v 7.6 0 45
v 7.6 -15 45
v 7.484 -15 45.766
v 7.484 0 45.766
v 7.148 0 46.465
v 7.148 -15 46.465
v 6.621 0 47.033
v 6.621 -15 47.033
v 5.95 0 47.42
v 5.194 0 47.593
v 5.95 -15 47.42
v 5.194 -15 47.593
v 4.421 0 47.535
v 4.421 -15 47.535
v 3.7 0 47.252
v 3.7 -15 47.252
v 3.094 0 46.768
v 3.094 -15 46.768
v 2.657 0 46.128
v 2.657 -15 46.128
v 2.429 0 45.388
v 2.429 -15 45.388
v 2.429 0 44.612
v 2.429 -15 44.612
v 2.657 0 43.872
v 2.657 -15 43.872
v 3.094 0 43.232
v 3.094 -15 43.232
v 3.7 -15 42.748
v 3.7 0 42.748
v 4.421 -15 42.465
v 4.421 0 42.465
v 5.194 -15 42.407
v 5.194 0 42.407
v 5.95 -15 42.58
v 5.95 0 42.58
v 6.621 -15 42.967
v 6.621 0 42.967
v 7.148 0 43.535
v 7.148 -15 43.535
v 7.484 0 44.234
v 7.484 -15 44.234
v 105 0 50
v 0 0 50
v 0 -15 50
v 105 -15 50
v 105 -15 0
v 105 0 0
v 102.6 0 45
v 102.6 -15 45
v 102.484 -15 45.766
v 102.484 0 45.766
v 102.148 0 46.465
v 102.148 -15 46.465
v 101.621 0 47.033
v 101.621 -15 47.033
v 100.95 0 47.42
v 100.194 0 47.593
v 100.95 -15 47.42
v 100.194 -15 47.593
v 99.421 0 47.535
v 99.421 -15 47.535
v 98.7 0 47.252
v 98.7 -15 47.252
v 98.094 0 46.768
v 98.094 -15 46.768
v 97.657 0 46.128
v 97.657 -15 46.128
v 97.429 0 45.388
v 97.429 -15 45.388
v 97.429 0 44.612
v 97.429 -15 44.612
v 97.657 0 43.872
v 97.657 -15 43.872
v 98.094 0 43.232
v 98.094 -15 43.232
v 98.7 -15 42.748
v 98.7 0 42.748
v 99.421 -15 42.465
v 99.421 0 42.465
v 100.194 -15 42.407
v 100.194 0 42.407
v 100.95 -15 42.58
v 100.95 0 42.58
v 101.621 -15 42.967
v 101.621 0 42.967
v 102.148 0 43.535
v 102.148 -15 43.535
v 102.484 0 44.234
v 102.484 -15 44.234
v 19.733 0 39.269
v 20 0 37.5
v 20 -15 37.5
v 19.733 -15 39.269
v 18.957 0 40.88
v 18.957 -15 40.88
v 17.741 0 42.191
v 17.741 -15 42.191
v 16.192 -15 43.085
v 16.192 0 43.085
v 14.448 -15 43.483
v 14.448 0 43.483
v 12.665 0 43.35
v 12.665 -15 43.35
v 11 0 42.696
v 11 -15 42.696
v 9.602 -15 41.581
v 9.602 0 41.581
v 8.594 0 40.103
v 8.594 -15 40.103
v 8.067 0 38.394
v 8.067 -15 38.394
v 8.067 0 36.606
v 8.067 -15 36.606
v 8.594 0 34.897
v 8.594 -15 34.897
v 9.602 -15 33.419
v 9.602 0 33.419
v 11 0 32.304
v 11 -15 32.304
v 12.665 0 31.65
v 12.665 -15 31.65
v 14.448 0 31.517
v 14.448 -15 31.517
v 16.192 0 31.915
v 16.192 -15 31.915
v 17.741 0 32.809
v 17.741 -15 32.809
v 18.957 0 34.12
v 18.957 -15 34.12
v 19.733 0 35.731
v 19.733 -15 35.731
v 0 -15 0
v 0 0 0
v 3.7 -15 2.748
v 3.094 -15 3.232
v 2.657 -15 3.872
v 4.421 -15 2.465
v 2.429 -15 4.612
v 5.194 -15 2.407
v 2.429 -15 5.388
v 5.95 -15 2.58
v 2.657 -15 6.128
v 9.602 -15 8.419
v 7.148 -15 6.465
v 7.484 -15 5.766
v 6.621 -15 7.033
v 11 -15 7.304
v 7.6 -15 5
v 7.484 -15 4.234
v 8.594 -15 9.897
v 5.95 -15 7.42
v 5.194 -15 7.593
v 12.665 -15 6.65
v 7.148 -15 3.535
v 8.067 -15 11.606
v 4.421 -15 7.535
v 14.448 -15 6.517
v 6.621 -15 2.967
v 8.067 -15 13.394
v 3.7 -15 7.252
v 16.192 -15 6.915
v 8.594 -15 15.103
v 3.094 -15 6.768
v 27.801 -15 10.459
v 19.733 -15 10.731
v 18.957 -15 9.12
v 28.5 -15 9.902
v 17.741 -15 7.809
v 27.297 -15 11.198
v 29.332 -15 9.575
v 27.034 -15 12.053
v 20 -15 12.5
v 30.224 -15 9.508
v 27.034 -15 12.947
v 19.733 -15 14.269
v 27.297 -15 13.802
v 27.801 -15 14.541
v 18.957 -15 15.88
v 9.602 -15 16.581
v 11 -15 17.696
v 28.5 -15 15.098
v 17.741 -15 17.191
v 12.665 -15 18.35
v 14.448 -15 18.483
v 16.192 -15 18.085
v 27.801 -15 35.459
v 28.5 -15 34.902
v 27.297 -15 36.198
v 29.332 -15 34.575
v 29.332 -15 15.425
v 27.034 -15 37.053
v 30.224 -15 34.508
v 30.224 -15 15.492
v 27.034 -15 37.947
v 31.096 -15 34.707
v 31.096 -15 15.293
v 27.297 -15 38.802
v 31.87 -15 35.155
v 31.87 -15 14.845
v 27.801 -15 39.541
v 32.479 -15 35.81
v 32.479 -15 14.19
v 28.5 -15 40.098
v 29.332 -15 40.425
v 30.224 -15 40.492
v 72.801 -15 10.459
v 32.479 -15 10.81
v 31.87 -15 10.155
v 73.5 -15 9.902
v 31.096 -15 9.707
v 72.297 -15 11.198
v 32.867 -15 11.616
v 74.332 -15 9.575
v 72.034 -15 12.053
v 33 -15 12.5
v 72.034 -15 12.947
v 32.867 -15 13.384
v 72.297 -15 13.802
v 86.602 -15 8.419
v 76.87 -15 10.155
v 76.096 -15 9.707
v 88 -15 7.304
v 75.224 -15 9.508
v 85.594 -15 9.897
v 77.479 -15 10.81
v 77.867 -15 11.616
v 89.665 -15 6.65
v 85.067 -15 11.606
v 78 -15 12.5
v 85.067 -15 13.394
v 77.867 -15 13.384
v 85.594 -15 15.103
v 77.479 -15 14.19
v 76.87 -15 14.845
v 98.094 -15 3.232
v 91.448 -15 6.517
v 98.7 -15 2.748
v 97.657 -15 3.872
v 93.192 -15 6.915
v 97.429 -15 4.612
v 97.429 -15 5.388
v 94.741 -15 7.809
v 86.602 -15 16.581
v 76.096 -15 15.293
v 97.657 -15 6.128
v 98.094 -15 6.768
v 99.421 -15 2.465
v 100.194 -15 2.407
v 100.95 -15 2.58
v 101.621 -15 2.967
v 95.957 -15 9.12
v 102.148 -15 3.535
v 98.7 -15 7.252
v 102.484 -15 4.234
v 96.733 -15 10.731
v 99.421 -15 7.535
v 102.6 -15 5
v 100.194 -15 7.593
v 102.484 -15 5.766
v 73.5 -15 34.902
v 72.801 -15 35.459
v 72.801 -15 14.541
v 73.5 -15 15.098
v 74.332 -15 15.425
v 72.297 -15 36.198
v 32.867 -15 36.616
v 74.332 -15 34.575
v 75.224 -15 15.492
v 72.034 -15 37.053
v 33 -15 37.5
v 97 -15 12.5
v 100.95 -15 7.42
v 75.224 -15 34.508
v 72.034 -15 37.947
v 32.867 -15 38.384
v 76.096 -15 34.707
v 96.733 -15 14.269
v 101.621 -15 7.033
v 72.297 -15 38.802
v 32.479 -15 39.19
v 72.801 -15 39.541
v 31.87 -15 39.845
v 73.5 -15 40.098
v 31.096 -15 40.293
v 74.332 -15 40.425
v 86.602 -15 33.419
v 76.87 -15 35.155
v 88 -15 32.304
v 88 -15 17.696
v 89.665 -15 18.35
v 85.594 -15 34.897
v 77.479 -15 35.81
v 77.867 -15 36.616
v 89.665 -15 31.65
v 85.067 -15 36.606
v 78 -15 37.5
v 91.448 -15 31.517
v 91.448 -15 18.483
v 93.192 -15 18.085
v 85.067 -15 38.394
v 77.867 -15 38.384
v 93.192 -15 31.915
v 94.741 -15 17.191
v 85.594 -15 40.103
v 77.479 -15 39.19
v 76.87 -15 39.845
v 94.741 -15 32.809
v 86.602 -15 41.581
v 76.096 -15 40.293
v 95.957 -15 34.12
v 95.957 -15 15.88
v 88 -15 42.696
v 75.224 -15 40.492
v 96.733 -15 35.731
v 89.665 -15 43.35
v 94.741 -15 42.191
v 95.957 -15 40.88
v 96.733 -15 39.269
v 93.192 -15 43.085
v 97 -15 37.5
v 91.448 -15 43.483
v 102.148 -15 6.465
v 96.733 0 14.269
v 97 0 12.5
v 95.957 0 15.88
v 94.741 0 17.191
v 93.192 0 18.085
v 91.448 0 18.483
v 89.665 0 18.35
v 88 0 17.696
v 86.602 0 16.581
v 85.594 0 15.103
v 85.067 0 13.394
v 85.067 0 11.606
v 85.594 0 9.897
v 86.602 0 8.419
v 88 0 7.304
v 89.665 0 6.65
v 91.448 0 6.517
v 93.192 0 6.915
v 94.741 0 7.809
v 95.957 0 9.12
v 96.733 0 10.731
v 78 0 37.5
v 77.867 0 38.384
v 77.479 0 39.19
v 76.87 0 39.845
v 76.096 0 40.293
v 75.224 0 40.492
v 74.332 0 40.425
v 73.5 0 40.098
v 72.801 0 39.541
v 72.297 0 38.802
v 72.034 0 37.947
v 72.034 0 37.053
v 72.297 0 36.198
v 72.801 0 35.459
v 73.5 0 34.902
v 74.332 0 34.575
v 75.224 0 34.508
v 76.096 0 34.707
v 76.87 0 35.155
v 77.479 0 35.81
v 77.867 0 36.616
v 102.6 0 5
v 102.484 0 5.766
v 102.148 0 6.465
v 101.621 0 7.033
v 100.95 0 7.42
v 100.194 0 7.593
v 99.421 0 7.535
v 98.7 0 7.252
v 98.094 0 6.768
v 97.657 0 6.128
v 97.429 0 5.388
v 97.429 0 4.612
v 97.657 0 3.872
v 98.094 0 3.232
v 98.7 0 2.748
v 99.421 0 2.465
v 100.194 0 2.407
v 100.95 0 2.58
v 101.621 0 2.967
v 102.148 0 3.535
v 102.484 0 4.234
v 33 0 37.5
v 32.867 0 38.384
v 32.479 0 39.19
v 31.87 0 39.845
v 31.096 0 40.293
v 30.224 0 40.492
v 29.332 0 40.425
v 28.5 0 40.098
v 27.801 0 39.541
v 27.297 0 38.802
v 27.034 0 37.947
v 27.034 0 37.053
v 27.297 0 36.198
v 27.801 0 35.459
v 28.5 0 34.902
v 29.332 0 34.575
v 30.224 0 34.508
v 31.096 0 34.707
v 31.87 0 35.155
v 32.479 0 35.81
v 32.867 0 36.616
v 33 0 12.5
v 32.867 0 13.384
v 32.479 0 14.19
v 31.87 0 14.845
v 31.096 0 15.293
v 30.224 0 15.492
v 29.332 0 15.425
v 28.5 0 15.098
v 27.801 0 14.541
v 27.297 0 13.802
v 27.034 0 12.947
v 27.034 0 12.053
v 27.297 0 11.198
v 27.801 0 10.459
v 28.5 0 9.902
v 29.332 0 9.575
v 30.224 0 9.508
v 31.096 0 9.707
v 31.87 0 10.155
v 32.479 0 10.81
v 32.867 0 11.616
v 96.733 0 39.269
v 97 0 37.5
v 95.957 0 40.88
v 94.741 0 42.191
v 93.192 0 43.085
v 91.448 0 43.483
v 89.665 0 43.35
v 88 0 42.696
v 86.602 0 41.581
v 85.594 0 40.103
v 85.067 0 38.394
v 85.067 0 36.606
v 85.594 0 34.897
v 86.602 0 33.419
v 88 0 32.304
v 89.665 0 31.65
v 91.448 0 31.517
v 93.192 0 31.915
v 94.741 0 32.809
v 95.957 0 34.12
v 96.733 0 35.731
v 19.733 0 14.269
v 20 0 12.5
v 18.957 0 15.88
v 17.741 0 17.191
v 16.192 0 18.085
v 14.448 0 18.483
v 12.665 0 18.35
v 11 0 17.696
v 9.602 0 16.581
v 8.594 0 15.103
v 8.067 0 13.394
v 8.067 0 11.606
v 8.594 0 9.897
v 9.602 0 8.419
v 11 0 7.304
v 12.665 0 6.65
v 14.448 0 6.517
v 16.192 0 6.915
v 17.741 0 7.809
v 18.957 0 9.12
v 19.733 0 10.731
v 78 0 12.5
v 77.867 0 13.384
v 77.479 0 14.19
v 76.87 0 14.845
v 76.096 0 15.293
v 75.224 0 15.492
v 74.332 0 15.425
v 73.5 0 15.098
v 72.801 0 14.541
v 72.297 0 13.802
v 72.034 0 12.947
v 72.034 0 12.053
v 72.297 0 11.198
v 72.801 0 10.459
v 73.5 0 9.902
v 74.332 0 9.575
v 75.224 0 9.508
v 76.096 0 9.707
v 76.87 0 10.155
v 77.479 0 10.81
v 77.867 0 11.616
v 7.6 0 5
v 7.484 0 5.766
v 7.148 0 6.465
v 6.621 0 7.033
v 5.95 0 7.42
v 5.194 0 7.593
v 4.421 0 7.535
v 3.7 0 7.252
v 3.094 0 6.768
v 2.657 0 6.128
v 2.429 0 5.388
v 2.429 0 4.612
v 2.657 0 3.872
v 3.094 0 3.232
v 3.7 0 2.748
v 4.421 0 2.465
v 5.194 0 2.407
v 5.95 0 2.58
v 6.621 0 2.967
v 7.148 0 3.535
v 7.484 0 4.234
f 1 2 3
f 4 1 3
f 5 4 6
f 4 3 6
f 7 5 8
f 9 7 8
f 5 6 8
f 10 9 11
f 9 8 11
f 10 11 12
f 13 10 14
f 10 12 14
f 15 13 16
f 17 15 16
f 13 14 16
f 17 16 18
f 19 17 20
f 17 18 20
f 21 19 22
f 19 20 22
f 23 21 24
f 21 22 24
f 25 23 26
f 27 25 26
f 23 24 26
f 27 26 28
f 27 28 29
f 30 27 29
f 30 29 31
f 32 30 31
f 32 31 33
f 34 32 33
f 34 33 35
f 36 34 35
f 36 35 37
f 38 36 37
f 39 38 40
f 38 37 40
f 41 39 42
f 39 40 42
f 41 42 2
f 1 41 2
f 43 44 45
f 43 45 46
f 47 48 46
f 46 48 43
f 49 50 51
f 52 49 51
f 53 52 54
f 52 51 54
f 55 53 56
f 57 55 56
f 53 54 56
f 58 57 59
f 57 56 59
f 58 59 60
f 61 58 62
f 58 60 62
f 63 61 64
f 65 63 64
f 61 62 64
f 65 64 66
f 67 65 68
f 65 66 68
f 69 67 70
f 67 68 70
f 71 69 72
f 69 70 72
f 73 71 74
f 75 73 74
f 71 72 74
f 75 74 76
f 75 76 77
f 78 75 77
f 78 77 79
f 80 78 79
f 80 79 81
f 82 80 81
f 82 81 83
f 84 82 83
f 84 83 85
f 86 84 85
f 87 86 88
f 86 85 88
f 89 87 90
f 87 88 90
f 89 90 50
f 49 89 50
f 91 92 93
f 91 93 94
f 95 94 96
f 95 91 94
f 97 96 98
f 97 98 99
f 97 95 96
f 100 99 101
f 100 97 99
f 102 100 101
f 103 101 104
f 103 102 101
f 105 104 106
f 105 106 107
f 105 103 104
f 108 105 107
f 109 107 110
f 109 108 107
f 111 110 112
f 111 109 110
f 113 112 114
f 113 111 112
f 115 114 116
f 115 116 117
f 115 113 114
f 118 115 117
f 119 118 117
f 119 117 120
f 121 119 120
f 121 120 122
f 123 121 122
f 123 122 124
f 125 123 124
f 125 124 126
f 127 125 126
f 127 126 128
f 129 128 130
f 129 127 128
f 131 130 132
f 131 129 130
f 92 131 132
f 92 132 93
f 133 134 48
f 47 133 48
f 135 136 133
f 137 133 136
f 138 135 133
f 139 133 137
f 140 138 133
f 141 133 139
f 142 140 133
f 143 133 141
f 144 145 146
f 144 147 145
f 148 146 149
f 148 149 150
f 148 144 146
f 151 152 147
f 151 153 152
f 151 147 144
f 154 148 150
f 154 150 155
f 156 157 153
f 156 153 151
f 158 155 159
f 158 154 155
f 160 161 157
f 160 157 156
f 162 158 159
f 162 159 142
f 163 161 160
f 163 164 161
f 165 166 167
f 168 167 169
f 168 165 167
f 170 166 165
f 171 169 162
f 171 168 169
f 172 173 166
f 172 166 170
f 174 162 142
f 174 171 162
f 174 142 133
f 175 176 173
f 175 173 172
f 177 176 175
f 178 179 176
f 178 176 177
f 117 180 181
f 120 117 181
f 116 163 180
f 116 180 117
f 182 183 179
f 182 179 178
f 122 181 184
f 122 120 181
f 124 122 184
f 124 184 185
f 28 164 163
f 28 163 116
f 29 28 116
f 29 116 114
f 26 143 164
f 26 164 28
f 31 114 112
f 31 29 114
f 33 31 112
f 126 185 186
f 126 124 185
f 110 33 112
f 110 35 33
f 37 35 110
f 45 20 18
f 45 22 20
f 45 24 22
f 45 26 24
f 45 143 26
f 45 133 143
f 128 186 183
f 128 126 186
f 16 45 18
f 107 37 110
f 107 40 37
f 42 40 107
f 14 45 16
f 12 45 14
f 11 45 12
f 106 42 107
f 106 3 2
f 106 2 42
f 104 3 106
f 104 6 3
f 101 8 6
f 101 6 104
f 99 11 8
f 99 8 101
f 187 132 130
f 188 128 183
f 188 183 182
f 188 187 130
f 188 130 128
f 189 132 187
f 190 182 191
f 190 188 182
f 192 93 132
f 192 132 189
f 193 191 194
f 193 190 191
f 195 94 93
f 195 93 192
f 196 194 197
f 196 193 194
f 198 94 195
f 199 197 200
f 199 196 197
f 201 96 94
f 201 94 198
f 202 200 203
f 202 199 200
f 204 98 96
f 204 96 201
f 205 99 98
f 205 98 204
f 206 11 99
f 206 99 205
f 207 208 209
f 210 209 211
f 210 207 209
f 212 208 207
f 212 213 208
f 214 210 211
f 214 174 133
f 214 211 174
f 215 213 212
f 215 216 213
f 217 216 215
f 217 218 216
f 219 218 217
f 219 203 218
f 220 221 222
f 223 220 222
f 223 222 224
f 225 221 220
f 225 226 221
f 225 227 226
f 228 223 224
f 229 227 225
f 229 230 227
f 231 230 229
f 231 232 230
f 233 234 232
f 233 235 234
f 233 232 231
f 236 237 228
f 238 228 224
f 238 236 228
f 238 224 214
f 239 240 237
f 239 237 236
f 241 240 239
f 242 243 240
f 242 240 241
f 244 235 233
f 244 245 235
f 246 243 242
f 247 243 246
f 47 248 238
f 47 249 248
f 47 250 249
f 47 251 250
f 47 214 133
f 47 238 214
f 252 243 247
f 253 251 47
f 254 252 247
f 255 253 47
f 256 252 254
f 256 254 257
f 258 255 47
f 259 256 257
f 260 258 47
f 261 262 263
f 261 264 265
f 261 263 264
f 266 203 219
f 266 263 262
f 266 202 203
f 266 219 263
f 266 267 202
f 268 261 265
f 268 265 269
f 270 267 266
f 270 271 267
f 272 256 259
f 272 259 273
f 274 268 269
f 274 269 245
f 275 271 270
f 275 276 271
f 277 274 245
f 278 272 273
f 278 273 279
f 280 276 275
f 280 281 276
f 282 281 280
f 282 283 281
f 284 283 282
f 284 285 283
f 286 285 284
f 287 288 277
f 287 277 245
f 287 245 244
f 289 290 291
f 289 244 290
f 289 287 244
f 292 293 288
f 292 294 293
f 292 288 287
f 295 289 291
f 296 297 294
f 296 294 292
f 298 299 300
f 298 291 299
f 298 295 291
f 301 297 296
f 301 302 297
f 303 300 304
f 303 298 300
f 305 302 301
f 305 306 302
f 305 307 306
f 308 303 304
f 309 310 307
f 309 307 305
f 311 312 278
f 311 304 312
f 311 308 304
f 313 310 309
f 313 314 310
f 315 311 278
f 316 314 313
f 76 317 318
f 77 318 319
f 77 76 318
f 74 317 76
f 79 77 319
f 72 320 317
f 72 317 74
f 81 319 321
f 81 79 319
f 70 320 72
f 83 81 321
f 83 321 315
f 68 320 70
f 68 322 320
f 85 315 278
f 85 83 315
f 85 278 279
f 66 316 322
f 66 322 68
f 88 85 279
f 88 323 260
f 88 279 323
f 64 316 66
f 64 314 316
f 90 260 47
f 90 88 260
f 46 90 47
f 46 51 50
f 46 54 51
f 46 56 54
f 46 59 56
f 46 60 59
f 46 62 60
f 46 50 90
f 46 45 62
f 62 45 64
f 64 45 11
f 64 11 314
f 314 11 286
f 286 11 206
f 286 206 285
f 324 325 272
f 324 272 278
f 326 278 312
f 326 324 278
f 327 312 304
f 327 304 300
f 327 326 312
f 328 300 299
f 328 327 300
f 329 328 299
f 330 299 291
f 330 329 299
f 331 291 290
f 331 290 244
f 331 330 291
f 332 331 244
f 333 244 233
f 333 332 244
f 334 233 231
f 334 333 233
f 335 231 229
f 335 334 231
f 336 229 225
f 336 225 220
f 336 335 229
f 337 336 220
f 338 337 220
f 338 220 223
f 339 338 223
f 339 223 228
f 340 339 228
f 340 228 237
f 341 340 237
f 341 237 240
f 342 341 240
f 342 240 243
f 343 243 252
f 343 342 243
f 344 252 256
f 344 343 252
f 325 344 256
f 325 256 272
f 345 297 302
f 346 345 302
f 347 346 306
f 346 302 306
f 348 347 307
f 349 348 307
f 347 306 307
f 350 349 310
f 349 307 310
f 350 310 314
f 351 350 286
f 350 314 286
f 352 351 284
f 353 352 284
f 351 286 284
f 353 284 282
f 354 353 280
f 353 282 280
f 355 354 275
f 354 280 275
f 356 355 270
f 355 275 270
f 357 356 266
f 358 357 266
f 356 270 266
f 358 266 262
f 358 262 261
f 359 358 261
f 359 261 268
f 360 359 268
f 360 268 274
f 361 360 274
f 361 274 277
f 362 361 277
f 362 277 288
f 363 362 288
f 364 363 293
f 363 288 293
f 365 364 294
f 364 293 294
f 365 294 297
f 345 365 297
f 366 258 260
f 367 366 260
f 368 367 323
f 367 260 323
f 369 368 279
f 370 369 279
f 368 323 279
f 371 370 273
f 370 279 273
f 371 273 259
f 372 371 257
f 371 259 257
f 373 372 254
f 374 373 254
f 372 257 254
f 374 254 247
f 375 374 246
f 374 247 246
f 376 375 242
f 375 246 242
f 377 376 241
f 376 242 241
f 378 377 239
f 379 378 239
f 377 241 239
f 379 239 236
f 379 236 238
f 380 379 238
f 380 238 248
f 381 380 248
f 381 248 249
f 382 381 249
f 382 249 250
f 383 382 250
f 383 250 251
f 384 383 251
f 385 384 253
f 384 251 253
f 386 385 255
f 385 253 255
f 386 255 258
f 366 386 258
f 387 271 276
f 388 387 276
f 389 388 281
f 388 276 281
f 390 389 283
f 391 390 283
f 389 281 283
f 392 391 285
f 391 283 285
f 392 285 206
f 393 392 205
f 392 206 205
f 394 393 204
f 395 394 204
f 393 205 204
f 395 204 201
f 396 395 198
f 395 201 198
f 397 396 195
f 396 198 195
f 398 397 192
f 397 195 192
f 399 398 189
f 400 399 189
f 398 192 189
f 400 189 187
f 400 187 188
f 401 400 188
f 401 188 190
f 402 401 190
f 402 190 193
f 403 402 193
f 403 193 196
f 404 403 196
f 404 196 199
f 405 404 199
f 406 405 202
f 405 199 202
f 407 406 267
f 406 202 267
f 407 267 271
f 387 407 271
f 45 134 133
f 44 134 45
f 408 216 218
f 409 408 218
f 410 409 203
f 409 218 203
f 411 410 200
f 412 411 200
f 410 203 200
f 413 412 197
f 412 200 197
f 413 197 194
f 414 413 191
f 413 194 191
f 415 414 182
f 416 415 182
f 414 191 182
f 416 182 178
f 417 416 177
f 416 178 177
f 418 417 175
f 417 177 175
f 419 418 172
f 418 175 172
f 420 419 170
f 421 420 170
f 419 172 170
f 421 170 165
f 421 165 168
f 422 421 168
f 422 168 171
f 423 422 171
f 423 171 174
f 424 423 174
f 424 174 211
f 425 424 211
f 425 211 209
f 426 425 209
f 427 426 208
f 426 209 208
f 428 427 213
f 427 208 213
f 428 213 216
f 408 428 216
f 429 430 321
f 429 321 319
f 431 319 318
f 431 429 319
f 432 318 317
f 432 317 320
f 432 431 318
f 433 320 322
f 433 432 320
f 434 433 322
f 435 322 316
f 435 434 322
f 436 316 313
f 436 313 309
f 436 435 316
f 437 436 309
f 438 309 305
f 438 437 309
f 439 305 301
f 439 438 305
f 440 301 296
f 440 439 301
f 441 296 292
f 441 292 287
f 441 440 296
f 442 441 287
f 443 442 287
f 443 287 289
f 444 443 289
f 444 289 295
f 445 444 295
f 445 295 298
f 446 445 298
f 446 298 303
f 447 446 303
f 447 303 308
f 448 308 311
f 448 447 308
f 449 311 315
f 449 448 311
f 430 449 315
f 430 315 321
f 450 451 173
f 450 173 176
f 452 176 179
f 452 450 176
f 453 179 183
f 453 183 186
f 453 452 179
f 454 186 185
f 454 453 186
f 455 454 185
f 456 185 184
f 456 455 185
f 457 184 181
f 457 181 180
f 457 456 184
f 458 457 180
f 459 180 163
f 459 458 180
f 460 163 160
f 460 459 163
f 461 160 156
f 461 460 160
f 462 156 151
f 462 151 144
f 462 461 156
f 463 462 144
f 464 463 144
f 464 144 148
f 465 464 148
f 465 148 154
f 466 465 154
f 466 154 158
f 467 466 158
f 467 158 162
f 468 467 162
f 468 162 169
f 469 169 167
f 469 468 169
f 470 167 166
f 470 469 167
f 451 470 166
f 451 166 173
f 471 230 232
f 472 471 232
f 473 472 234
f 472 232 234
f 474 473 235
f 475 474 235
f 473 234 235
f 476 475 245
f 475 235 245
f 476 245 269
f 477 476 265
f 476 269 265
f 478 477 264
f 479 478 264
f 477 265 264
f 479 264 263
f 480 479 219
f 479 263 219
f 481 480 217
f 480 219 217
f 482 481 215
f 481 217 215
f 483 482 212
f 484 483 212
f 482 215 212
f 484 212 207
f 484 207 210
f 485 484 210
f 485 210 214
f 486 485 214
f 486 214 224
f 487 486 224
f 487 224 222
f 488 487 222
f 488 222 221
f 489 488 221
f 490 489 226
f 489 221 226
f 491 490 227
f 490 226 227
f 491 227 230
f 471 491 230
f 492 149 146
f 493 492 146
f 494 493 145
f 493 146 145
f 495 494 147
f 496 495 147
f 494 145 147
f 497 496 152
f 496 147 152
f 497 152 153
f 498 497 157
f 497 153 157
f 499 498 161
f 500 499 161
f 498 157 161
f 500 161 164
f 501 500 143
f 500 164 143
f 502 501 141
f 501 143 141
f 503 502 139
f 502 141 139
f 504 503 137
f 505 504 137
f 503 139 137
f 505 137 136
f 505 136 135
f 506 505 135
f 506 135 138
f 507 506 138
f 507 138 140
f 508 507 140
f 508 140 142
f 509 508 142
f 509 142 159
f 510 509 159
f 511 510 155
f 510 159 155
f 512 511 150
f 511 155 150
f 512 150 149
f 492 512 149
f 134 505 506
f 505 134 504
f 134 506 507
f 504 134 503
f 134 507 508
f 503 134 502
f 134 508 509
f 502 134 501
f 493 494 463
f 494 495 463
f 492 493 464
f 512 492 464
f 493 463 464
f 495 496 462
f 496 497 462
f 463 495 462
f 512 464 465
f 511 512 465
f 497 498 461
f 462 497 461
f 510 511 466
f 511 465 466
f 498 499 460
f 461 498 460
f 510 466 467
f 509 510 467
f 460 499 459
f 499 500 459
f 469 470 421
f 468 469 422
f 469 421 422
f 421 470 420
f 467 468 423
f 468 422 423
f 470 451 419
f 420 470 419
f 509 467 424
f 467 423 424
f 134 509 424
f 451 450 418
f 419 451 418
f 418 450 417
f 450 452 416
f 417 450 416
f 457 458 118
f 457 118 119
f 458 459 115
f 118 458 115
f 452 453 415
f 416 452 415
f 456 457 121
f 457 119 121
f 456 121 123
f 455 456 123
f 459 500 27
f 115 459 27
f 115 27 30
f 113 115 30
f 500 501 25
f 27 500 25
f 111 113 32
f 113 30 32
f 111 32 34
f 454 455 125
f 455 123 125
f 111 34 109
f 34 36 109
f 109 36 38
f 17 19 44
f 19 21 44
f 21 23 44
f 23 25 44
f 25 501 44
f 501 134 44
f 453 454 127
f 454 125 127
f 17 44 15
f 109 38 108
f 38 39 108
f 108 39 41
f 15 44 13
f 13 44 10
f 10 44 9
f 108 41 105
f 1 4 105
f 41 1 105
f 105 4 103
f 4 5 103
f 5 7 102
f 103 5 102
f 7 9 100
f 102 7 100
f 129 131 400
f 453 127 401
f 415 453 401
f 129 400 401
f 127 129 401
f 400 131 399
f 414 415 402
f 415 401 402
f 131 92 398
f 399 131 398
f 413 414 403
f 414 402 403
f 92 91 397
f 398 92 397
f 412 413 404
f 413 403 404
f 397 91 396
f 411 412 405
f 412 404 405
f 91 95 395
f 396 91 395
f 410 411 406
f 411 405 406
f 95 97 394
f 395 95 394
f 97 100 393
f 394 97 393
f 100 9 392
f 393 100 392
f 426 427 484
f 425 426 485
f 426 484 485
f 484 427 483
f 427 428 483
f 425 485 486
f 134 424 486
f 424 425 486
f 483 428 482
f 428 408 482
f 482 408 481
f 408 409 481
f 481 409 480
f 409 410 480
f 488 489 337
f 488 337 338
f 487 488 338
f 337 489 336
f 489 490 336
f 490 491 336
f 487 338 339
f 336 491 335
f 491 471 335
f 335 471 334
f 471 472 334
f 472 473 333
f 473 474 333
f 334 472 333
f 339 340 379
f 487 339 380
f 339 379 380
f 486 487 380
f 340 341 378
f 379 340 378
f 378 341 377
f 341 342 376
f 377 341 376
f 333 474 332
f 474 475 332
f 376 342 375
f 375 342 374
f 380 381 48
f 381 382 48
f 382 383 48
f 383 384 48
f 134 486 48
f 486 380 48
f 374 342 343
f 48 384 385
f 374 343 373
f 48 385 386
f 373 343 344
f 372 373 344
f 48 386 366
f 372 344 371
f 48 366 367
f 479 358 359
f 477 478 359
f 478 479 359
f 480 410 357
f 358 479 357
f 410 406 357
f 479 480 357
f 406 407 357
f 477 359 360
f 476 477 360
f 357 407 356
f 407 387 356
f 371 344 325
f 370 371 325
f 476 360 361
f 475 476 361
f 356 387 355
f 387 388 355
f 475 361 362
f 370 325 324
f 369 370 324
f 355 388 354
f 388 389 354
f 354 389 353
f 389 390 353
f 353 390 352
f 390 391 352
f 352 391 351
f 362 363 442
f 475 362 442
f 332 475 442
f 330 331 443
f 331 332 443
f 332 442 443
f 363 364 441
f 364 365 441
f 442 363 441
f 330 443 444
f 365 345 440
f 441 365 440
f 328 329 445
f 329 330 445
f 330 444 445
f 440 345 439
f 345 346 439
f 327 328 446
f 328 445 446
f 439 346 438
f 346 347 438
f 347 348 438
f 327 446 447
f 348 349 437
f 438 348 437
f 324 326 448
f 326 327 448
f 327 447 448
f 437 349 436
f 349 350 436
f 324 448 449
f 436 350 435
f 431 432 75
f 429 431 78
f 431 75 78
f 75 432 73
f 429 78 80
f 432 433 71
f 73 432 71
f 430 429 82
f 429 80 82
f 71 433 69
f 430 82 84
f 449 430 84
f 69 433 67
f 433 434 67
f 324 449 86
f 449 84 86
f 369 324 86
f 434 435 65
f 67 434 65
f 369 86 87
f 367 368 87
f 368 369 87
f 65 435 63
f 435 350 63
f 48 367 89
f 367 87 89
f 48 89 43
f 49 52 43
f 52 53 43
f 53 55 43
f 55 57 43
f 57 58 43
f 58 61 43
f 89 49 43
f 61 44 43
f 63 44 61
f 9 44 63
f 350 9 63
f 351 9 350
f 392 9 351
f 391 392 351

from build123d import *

# Parameters (mm, degrees)
F0_W     = 105
F0_H     = 50
F0_R     = 6
F1_DEPTH = 15
F2_R     = 3
F3_DEPTH = 15
F4_R     = 2.6
F5_DEPTH = 15


with BuildPart() as f1:
    # F0 (on Front) → F1 (new body)
    with BuildSketch(Plane.XZ):
        with Locations((52.5, 25)):
            Rectangle(F0_W, F0_H)
        with Locations((14, 12.5)):
            Circle(F0_R, mode=Mode.SUBTRACT)
        with Locations((91, 12.5)):
            Circle(F0_R, mode=Mode.SUBTRACT)
        with Locations((14, 37.5)):
            Circle(F0_R, mode=Mode.SUBTRACT)
        with Locations((91, 37.5)):
            Circle(F0_R, mode=Mode.SUBTRACT)
    extrude(amount=F1_DEPTH)

    # F2 (on face) → F3 (cut, through all)
    with BuildSketch(Plane.XZ.offset(15)):
        with Locations((30, 37.5)):
            Circle(F2_R)
        with Locations((75, 37.5)):
            Circle(F2_R)
        with Locations((30, 12.5)):
            Circle(F2_R)
        with Locations((75, 12.5)):
            Circle(F2_R)
    extrude(amount=-F3_DEPTH, mode=Mode.SUBTRACT)

    # F4 (on face) → F5 (cut, through all)
    with BuildSketch(Plane.XZ.offset(15)):
        with Locations((5, 45)):
            Circle(F4_R)
        with Locations((100, 45)):
            Circle(F4_R)
        with Locations((100, 5)):
            Circle(F4_R)
        with Locations((5, 5)):
            Circle(F4_R)
    extrude(amount=-F5_DEPTH, mode=Mode.SUBTRACT)


solid = f1.part
